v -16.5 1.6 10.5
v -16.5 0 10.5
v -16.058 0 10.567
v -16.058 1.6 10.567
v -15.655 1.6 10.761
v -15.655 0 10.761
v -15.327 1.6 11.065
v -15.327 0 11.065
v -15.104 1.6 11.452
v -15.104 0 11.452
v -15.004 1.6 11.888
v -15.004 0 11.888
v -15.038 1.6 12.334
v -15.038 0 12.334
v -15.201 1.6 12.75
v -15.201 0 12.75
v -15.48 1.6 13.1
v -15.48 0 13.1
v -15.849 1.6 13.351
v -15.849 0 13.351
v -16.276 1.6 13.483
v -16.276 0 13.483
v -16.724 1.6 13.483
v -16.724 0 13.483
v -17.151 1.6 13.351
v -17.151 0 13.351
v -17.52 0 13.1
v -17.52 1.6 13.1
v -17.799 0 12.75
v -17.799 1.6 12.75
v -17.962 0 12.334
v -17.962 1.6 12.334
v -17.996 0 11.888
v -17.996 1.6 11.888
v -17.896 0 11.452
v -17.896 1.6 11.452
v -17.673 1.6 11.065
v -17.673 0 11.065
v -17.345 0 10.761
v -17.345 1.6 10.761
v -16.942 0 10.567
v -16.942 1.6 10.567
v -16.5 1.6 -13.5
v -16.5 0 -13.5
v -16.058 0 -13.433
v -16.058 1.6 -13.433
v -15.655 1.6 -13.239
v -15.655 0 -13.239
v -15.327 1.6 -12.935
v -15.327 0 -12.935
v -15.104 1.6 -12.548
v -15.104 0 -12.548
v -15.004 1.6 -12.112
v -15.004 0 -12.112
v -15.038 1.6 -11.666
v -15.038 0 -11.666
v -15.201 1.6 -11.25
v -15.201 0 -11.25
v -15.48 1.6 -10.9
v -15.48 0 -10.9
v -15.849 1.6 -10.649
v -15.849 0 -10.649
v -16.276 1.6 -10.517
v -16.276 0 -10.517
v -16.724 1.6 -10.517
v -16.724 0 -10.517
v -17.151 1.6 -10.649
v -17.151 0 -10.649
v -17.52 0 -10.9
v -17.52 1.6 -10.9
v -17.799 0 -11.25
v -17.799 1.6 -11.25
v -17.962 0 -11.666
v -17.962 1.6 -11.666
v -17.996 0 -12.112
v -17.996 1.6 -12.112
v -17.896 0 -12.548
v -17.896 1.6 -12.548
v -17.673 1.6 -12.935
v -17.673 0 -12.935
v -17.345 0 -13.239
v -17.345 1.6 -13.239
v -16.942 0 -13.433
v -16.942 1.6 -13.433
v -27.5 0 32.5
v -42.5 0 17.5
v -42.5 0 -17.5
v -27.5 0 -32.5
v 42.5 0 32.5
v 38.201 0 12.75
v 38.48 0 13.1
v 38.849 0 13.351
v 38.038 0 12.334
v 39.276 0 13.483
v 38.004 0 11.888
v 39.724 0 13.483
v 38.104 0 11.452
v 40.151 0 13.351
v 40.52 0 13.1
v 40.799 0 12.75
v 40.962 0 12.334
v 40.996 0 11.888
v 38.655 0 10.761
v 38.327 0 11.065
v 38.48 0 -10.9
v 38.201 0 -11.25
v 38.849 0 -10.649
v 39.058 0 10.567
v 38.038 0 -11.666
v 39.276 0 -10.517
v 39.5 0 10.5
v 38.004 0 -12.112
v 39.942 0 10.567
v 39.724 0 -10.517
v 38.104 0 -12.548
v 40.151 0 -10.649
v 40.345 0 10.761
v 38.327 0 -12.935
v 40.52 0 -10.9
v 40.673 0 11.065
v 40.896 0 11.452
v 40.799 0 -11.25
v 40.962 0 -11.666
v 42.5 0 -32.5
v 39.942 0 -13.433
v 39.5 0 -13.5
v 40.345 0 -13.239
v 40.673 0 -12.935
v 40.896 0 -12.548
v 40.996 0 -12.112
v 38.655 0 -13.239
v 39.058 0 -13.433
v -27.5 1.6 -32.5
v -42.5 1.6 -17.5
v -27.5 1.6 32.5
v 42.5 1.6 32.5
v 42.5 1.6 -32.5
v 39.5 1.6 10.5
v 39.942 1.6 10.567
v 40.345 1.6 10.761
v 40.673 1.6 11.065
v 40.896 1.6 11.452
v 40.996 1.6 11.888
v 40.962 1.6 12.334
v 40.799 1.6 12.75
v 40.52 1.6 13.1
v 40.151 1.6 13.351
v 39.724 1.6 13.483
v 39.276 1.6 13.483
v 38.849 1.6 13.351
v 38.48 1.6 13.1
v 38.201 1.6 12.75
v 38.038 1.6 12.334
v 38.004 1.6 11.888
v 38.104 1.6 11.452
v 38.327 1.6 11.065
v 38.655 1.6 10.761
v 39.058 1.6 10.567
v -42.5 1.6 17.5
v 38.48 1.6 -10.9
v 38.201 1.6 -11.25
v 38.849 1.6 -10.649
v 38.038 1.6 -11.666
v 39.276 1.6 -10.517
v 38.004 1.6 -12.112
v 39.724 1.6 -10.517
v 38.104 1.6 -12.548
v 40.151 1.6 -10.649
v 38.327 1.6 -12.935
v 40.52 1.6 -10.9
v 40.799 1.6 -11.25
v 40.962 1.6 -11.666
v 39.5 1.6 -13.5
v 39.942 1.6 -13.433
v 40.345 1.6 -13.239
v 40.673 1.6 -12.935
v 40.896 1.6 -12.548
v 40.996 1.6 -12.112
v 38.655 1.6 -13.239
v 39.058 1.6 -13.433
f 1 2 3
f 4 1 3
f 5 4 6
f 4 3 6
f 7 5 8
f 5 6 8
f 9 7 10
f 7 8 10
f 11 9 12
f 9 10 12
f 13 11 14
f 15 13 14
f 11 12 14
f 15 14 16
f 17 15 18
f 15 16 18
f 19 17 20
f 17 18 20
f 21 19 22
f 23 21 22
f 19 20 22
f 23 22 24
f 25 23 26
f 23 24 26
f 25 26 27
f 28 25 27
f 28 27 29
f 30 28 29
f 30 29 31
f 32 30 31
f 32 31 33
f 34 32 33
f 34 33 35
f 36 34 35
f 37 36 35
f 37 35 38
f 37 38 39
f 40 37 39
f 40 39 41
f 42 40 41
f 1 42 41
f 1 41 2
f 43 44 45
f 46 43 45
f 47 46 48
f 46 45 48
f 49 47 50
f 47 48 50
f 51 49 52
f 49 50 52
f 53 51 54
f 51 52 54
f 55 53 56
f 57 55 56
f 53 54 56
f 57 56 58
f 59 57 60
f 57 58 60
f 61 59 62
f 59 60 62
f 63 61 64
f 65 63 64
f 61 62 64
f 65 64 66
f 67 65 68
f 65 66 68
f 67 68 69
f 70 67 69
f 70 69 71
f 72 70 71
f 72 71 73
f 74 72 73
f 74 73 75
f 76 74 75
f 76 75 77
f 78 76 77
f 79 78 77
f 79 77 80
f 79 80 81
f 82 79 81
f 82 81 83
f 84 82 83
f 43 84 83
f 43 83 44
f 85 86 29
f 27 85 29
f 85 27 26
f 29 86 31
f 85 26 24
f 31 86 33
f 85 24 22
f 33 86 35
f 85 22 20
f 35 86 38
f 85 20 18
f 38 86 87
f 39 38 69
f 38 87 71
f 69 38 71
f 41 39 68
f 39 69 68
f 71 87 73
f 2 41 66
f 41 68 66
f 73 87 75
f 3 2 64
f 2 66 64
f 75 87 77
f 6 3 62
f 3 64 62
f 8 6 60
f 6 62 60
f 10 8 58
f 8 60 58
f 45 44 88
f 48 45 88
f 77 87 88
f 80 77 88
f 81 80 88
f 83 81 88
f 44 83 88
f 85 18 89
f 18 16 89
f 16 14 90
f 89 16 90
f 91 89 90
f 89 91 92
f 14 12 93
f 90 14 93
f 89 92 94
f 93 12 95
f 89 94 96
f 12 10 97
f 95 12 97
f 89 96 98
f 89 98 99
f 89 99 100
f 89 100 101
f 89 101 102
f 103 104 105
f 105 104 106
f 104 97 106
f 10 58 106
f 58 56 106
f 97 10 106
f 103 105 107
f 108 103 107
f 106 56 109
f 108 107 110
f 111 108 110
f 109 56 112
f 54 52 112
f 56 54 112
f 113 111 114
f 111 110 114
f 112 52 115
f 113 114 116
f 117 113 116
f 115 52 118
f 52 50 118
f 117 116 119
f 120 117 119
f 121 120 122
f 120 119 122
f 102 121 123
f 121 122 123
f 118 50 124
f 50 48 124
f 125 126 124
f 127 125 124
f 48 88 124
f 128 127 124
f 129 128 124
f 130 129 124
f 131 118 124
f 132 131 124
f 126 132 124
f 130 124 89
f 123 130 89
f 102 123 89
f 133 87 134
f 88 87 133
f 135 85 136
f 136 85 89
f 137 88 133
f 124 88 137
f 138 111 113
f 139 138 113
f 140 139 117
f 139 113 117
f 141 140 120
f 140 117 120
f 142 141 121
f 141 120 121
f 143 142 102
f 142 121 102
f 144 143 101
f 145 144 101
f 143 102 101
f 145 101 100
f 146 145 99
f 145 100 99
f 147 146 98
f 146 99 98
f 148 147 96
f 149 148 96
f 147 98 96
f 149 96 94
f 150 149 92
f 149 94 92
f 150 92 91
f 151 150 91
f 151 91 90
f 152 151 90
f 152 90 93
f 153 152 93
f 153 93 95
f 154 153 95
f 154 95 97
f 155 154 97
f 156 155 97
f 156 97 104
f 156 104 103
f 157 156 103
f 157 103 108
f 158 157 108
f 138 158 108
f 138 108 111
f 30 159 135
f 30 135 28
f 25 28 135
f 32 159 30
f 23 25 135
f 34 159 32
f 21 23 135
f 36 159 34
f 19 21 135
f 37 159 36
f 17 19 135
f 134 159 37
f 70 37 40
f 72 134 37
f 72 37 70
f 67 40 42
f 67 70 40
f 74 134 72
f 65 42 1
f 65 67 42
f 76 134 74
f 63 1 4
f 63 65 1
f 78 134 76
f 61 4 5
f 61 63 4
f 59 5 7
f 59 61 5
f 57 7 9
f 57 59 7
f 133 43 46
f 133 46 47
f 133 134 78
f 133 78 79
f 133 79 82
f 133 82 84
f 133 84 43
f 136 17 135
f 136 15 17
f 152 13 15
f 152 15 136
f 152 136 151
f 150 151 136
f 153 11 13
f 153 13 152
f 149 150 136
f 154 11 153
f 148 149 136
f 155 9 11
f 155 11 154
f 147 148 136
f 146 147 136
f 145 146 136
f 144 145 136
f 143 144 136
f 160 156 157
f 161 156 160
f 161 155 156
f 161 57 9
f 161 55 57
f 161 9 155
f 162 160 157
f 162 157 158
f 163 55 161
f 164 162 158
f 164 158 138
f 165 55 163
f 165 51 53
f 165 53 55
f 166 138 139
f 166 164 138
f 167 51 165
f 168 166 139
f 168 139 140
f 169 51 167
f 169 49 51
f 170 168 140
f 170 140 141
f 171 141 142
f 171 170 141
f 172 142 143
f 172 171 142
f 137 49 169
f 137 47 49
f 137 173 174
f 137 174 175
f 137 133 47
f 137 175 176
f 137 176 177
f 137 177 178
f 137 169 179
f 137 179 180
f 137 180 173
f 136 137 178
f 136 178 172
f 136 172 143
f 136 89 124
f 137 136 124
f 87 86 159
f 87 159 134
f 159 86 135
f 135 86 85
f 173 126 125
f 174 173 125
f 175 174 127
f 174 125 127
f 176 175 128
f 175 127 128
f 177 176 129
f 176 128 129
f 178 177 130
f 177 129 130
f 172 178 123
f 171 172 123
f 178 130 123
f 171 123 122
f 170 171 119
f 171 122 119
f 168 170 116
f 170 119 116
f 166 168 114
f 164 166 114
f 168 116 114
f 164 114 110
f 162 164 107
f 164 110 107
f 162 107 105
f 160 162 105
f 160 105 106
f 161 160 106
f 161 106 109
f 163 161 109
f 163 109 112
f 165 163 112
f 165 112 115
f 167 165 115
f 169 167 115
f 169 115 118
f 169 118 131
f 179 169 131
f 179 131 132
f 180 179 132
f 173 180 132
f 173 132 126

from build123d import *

# Parameters (mm, degrees)
SKETCH1_W           = 85
SKETCH1_H           = 65
BOSS_EXTRUDE1_DEPTH = 1.6
CUT_EXTRUDE1_DEPTH  = 10
SKETCH4_R           = 1.5
CUT_EXTRUDE2_DEPTH  = 16


with BuildPart() as part:
    # Sketch1 → Boss-Extrude1 (new body)
    with BuildSketch(Plane(origin=(0, 0, 0), x_dir=(1, 0, 0), z_dir=(0, 1, 0))):
        Rectangle(SKETCH1_W, SKETCH1_H)
    extrude(amount=BOSS_EXTRUDE1_DEPTH)

    # Sketch3 → Cut-Extrude1 (cut)
    with BuildSketch(Plane(origin=(0, 0, 0), x_dir=(-1, 0, 0), z_dir=(0, -1, 0))):
        Polygon((42.5, 32.5), (42.5, 17.5), (27.5, 32.5), align=None)
        Polygon((27.5, -32.5), (42.5, -32.5), (42.5, -17.5), align=None)
    extrude(amount=-CUT_EXTRUDE1_DEPTH, mode=Mode.SUBTRACT)

    # Sketch4 → Cut-Extrude2 (cut)
    with BuildSketch(Plane(origin=(0, 0, 0), x_dir=(-1, 0, 0), z_dir=(0, -1, 0))):
        with Locations(Location((16.5, -12, 0), (0, 0, 90))):
            Circle(SKETCH4_R)
        with Locations(Location((16.5, 12, 0), (0, 0, 90))):
            Circle(SKETCH4_R)
        with Locations(Location((-39.5, -12, 0), (0, 0, 90))):
            Circle(SKETCH4_R)
        with Locations(Location((-39.5, 12, 0), (0, 0, 90))):
            Circle(SKETCH4_R)
    extrude(amount=-CUT_EXTRUDE2_DEPTH, mode=Mode.SUBTRACT)


solid = part.part
